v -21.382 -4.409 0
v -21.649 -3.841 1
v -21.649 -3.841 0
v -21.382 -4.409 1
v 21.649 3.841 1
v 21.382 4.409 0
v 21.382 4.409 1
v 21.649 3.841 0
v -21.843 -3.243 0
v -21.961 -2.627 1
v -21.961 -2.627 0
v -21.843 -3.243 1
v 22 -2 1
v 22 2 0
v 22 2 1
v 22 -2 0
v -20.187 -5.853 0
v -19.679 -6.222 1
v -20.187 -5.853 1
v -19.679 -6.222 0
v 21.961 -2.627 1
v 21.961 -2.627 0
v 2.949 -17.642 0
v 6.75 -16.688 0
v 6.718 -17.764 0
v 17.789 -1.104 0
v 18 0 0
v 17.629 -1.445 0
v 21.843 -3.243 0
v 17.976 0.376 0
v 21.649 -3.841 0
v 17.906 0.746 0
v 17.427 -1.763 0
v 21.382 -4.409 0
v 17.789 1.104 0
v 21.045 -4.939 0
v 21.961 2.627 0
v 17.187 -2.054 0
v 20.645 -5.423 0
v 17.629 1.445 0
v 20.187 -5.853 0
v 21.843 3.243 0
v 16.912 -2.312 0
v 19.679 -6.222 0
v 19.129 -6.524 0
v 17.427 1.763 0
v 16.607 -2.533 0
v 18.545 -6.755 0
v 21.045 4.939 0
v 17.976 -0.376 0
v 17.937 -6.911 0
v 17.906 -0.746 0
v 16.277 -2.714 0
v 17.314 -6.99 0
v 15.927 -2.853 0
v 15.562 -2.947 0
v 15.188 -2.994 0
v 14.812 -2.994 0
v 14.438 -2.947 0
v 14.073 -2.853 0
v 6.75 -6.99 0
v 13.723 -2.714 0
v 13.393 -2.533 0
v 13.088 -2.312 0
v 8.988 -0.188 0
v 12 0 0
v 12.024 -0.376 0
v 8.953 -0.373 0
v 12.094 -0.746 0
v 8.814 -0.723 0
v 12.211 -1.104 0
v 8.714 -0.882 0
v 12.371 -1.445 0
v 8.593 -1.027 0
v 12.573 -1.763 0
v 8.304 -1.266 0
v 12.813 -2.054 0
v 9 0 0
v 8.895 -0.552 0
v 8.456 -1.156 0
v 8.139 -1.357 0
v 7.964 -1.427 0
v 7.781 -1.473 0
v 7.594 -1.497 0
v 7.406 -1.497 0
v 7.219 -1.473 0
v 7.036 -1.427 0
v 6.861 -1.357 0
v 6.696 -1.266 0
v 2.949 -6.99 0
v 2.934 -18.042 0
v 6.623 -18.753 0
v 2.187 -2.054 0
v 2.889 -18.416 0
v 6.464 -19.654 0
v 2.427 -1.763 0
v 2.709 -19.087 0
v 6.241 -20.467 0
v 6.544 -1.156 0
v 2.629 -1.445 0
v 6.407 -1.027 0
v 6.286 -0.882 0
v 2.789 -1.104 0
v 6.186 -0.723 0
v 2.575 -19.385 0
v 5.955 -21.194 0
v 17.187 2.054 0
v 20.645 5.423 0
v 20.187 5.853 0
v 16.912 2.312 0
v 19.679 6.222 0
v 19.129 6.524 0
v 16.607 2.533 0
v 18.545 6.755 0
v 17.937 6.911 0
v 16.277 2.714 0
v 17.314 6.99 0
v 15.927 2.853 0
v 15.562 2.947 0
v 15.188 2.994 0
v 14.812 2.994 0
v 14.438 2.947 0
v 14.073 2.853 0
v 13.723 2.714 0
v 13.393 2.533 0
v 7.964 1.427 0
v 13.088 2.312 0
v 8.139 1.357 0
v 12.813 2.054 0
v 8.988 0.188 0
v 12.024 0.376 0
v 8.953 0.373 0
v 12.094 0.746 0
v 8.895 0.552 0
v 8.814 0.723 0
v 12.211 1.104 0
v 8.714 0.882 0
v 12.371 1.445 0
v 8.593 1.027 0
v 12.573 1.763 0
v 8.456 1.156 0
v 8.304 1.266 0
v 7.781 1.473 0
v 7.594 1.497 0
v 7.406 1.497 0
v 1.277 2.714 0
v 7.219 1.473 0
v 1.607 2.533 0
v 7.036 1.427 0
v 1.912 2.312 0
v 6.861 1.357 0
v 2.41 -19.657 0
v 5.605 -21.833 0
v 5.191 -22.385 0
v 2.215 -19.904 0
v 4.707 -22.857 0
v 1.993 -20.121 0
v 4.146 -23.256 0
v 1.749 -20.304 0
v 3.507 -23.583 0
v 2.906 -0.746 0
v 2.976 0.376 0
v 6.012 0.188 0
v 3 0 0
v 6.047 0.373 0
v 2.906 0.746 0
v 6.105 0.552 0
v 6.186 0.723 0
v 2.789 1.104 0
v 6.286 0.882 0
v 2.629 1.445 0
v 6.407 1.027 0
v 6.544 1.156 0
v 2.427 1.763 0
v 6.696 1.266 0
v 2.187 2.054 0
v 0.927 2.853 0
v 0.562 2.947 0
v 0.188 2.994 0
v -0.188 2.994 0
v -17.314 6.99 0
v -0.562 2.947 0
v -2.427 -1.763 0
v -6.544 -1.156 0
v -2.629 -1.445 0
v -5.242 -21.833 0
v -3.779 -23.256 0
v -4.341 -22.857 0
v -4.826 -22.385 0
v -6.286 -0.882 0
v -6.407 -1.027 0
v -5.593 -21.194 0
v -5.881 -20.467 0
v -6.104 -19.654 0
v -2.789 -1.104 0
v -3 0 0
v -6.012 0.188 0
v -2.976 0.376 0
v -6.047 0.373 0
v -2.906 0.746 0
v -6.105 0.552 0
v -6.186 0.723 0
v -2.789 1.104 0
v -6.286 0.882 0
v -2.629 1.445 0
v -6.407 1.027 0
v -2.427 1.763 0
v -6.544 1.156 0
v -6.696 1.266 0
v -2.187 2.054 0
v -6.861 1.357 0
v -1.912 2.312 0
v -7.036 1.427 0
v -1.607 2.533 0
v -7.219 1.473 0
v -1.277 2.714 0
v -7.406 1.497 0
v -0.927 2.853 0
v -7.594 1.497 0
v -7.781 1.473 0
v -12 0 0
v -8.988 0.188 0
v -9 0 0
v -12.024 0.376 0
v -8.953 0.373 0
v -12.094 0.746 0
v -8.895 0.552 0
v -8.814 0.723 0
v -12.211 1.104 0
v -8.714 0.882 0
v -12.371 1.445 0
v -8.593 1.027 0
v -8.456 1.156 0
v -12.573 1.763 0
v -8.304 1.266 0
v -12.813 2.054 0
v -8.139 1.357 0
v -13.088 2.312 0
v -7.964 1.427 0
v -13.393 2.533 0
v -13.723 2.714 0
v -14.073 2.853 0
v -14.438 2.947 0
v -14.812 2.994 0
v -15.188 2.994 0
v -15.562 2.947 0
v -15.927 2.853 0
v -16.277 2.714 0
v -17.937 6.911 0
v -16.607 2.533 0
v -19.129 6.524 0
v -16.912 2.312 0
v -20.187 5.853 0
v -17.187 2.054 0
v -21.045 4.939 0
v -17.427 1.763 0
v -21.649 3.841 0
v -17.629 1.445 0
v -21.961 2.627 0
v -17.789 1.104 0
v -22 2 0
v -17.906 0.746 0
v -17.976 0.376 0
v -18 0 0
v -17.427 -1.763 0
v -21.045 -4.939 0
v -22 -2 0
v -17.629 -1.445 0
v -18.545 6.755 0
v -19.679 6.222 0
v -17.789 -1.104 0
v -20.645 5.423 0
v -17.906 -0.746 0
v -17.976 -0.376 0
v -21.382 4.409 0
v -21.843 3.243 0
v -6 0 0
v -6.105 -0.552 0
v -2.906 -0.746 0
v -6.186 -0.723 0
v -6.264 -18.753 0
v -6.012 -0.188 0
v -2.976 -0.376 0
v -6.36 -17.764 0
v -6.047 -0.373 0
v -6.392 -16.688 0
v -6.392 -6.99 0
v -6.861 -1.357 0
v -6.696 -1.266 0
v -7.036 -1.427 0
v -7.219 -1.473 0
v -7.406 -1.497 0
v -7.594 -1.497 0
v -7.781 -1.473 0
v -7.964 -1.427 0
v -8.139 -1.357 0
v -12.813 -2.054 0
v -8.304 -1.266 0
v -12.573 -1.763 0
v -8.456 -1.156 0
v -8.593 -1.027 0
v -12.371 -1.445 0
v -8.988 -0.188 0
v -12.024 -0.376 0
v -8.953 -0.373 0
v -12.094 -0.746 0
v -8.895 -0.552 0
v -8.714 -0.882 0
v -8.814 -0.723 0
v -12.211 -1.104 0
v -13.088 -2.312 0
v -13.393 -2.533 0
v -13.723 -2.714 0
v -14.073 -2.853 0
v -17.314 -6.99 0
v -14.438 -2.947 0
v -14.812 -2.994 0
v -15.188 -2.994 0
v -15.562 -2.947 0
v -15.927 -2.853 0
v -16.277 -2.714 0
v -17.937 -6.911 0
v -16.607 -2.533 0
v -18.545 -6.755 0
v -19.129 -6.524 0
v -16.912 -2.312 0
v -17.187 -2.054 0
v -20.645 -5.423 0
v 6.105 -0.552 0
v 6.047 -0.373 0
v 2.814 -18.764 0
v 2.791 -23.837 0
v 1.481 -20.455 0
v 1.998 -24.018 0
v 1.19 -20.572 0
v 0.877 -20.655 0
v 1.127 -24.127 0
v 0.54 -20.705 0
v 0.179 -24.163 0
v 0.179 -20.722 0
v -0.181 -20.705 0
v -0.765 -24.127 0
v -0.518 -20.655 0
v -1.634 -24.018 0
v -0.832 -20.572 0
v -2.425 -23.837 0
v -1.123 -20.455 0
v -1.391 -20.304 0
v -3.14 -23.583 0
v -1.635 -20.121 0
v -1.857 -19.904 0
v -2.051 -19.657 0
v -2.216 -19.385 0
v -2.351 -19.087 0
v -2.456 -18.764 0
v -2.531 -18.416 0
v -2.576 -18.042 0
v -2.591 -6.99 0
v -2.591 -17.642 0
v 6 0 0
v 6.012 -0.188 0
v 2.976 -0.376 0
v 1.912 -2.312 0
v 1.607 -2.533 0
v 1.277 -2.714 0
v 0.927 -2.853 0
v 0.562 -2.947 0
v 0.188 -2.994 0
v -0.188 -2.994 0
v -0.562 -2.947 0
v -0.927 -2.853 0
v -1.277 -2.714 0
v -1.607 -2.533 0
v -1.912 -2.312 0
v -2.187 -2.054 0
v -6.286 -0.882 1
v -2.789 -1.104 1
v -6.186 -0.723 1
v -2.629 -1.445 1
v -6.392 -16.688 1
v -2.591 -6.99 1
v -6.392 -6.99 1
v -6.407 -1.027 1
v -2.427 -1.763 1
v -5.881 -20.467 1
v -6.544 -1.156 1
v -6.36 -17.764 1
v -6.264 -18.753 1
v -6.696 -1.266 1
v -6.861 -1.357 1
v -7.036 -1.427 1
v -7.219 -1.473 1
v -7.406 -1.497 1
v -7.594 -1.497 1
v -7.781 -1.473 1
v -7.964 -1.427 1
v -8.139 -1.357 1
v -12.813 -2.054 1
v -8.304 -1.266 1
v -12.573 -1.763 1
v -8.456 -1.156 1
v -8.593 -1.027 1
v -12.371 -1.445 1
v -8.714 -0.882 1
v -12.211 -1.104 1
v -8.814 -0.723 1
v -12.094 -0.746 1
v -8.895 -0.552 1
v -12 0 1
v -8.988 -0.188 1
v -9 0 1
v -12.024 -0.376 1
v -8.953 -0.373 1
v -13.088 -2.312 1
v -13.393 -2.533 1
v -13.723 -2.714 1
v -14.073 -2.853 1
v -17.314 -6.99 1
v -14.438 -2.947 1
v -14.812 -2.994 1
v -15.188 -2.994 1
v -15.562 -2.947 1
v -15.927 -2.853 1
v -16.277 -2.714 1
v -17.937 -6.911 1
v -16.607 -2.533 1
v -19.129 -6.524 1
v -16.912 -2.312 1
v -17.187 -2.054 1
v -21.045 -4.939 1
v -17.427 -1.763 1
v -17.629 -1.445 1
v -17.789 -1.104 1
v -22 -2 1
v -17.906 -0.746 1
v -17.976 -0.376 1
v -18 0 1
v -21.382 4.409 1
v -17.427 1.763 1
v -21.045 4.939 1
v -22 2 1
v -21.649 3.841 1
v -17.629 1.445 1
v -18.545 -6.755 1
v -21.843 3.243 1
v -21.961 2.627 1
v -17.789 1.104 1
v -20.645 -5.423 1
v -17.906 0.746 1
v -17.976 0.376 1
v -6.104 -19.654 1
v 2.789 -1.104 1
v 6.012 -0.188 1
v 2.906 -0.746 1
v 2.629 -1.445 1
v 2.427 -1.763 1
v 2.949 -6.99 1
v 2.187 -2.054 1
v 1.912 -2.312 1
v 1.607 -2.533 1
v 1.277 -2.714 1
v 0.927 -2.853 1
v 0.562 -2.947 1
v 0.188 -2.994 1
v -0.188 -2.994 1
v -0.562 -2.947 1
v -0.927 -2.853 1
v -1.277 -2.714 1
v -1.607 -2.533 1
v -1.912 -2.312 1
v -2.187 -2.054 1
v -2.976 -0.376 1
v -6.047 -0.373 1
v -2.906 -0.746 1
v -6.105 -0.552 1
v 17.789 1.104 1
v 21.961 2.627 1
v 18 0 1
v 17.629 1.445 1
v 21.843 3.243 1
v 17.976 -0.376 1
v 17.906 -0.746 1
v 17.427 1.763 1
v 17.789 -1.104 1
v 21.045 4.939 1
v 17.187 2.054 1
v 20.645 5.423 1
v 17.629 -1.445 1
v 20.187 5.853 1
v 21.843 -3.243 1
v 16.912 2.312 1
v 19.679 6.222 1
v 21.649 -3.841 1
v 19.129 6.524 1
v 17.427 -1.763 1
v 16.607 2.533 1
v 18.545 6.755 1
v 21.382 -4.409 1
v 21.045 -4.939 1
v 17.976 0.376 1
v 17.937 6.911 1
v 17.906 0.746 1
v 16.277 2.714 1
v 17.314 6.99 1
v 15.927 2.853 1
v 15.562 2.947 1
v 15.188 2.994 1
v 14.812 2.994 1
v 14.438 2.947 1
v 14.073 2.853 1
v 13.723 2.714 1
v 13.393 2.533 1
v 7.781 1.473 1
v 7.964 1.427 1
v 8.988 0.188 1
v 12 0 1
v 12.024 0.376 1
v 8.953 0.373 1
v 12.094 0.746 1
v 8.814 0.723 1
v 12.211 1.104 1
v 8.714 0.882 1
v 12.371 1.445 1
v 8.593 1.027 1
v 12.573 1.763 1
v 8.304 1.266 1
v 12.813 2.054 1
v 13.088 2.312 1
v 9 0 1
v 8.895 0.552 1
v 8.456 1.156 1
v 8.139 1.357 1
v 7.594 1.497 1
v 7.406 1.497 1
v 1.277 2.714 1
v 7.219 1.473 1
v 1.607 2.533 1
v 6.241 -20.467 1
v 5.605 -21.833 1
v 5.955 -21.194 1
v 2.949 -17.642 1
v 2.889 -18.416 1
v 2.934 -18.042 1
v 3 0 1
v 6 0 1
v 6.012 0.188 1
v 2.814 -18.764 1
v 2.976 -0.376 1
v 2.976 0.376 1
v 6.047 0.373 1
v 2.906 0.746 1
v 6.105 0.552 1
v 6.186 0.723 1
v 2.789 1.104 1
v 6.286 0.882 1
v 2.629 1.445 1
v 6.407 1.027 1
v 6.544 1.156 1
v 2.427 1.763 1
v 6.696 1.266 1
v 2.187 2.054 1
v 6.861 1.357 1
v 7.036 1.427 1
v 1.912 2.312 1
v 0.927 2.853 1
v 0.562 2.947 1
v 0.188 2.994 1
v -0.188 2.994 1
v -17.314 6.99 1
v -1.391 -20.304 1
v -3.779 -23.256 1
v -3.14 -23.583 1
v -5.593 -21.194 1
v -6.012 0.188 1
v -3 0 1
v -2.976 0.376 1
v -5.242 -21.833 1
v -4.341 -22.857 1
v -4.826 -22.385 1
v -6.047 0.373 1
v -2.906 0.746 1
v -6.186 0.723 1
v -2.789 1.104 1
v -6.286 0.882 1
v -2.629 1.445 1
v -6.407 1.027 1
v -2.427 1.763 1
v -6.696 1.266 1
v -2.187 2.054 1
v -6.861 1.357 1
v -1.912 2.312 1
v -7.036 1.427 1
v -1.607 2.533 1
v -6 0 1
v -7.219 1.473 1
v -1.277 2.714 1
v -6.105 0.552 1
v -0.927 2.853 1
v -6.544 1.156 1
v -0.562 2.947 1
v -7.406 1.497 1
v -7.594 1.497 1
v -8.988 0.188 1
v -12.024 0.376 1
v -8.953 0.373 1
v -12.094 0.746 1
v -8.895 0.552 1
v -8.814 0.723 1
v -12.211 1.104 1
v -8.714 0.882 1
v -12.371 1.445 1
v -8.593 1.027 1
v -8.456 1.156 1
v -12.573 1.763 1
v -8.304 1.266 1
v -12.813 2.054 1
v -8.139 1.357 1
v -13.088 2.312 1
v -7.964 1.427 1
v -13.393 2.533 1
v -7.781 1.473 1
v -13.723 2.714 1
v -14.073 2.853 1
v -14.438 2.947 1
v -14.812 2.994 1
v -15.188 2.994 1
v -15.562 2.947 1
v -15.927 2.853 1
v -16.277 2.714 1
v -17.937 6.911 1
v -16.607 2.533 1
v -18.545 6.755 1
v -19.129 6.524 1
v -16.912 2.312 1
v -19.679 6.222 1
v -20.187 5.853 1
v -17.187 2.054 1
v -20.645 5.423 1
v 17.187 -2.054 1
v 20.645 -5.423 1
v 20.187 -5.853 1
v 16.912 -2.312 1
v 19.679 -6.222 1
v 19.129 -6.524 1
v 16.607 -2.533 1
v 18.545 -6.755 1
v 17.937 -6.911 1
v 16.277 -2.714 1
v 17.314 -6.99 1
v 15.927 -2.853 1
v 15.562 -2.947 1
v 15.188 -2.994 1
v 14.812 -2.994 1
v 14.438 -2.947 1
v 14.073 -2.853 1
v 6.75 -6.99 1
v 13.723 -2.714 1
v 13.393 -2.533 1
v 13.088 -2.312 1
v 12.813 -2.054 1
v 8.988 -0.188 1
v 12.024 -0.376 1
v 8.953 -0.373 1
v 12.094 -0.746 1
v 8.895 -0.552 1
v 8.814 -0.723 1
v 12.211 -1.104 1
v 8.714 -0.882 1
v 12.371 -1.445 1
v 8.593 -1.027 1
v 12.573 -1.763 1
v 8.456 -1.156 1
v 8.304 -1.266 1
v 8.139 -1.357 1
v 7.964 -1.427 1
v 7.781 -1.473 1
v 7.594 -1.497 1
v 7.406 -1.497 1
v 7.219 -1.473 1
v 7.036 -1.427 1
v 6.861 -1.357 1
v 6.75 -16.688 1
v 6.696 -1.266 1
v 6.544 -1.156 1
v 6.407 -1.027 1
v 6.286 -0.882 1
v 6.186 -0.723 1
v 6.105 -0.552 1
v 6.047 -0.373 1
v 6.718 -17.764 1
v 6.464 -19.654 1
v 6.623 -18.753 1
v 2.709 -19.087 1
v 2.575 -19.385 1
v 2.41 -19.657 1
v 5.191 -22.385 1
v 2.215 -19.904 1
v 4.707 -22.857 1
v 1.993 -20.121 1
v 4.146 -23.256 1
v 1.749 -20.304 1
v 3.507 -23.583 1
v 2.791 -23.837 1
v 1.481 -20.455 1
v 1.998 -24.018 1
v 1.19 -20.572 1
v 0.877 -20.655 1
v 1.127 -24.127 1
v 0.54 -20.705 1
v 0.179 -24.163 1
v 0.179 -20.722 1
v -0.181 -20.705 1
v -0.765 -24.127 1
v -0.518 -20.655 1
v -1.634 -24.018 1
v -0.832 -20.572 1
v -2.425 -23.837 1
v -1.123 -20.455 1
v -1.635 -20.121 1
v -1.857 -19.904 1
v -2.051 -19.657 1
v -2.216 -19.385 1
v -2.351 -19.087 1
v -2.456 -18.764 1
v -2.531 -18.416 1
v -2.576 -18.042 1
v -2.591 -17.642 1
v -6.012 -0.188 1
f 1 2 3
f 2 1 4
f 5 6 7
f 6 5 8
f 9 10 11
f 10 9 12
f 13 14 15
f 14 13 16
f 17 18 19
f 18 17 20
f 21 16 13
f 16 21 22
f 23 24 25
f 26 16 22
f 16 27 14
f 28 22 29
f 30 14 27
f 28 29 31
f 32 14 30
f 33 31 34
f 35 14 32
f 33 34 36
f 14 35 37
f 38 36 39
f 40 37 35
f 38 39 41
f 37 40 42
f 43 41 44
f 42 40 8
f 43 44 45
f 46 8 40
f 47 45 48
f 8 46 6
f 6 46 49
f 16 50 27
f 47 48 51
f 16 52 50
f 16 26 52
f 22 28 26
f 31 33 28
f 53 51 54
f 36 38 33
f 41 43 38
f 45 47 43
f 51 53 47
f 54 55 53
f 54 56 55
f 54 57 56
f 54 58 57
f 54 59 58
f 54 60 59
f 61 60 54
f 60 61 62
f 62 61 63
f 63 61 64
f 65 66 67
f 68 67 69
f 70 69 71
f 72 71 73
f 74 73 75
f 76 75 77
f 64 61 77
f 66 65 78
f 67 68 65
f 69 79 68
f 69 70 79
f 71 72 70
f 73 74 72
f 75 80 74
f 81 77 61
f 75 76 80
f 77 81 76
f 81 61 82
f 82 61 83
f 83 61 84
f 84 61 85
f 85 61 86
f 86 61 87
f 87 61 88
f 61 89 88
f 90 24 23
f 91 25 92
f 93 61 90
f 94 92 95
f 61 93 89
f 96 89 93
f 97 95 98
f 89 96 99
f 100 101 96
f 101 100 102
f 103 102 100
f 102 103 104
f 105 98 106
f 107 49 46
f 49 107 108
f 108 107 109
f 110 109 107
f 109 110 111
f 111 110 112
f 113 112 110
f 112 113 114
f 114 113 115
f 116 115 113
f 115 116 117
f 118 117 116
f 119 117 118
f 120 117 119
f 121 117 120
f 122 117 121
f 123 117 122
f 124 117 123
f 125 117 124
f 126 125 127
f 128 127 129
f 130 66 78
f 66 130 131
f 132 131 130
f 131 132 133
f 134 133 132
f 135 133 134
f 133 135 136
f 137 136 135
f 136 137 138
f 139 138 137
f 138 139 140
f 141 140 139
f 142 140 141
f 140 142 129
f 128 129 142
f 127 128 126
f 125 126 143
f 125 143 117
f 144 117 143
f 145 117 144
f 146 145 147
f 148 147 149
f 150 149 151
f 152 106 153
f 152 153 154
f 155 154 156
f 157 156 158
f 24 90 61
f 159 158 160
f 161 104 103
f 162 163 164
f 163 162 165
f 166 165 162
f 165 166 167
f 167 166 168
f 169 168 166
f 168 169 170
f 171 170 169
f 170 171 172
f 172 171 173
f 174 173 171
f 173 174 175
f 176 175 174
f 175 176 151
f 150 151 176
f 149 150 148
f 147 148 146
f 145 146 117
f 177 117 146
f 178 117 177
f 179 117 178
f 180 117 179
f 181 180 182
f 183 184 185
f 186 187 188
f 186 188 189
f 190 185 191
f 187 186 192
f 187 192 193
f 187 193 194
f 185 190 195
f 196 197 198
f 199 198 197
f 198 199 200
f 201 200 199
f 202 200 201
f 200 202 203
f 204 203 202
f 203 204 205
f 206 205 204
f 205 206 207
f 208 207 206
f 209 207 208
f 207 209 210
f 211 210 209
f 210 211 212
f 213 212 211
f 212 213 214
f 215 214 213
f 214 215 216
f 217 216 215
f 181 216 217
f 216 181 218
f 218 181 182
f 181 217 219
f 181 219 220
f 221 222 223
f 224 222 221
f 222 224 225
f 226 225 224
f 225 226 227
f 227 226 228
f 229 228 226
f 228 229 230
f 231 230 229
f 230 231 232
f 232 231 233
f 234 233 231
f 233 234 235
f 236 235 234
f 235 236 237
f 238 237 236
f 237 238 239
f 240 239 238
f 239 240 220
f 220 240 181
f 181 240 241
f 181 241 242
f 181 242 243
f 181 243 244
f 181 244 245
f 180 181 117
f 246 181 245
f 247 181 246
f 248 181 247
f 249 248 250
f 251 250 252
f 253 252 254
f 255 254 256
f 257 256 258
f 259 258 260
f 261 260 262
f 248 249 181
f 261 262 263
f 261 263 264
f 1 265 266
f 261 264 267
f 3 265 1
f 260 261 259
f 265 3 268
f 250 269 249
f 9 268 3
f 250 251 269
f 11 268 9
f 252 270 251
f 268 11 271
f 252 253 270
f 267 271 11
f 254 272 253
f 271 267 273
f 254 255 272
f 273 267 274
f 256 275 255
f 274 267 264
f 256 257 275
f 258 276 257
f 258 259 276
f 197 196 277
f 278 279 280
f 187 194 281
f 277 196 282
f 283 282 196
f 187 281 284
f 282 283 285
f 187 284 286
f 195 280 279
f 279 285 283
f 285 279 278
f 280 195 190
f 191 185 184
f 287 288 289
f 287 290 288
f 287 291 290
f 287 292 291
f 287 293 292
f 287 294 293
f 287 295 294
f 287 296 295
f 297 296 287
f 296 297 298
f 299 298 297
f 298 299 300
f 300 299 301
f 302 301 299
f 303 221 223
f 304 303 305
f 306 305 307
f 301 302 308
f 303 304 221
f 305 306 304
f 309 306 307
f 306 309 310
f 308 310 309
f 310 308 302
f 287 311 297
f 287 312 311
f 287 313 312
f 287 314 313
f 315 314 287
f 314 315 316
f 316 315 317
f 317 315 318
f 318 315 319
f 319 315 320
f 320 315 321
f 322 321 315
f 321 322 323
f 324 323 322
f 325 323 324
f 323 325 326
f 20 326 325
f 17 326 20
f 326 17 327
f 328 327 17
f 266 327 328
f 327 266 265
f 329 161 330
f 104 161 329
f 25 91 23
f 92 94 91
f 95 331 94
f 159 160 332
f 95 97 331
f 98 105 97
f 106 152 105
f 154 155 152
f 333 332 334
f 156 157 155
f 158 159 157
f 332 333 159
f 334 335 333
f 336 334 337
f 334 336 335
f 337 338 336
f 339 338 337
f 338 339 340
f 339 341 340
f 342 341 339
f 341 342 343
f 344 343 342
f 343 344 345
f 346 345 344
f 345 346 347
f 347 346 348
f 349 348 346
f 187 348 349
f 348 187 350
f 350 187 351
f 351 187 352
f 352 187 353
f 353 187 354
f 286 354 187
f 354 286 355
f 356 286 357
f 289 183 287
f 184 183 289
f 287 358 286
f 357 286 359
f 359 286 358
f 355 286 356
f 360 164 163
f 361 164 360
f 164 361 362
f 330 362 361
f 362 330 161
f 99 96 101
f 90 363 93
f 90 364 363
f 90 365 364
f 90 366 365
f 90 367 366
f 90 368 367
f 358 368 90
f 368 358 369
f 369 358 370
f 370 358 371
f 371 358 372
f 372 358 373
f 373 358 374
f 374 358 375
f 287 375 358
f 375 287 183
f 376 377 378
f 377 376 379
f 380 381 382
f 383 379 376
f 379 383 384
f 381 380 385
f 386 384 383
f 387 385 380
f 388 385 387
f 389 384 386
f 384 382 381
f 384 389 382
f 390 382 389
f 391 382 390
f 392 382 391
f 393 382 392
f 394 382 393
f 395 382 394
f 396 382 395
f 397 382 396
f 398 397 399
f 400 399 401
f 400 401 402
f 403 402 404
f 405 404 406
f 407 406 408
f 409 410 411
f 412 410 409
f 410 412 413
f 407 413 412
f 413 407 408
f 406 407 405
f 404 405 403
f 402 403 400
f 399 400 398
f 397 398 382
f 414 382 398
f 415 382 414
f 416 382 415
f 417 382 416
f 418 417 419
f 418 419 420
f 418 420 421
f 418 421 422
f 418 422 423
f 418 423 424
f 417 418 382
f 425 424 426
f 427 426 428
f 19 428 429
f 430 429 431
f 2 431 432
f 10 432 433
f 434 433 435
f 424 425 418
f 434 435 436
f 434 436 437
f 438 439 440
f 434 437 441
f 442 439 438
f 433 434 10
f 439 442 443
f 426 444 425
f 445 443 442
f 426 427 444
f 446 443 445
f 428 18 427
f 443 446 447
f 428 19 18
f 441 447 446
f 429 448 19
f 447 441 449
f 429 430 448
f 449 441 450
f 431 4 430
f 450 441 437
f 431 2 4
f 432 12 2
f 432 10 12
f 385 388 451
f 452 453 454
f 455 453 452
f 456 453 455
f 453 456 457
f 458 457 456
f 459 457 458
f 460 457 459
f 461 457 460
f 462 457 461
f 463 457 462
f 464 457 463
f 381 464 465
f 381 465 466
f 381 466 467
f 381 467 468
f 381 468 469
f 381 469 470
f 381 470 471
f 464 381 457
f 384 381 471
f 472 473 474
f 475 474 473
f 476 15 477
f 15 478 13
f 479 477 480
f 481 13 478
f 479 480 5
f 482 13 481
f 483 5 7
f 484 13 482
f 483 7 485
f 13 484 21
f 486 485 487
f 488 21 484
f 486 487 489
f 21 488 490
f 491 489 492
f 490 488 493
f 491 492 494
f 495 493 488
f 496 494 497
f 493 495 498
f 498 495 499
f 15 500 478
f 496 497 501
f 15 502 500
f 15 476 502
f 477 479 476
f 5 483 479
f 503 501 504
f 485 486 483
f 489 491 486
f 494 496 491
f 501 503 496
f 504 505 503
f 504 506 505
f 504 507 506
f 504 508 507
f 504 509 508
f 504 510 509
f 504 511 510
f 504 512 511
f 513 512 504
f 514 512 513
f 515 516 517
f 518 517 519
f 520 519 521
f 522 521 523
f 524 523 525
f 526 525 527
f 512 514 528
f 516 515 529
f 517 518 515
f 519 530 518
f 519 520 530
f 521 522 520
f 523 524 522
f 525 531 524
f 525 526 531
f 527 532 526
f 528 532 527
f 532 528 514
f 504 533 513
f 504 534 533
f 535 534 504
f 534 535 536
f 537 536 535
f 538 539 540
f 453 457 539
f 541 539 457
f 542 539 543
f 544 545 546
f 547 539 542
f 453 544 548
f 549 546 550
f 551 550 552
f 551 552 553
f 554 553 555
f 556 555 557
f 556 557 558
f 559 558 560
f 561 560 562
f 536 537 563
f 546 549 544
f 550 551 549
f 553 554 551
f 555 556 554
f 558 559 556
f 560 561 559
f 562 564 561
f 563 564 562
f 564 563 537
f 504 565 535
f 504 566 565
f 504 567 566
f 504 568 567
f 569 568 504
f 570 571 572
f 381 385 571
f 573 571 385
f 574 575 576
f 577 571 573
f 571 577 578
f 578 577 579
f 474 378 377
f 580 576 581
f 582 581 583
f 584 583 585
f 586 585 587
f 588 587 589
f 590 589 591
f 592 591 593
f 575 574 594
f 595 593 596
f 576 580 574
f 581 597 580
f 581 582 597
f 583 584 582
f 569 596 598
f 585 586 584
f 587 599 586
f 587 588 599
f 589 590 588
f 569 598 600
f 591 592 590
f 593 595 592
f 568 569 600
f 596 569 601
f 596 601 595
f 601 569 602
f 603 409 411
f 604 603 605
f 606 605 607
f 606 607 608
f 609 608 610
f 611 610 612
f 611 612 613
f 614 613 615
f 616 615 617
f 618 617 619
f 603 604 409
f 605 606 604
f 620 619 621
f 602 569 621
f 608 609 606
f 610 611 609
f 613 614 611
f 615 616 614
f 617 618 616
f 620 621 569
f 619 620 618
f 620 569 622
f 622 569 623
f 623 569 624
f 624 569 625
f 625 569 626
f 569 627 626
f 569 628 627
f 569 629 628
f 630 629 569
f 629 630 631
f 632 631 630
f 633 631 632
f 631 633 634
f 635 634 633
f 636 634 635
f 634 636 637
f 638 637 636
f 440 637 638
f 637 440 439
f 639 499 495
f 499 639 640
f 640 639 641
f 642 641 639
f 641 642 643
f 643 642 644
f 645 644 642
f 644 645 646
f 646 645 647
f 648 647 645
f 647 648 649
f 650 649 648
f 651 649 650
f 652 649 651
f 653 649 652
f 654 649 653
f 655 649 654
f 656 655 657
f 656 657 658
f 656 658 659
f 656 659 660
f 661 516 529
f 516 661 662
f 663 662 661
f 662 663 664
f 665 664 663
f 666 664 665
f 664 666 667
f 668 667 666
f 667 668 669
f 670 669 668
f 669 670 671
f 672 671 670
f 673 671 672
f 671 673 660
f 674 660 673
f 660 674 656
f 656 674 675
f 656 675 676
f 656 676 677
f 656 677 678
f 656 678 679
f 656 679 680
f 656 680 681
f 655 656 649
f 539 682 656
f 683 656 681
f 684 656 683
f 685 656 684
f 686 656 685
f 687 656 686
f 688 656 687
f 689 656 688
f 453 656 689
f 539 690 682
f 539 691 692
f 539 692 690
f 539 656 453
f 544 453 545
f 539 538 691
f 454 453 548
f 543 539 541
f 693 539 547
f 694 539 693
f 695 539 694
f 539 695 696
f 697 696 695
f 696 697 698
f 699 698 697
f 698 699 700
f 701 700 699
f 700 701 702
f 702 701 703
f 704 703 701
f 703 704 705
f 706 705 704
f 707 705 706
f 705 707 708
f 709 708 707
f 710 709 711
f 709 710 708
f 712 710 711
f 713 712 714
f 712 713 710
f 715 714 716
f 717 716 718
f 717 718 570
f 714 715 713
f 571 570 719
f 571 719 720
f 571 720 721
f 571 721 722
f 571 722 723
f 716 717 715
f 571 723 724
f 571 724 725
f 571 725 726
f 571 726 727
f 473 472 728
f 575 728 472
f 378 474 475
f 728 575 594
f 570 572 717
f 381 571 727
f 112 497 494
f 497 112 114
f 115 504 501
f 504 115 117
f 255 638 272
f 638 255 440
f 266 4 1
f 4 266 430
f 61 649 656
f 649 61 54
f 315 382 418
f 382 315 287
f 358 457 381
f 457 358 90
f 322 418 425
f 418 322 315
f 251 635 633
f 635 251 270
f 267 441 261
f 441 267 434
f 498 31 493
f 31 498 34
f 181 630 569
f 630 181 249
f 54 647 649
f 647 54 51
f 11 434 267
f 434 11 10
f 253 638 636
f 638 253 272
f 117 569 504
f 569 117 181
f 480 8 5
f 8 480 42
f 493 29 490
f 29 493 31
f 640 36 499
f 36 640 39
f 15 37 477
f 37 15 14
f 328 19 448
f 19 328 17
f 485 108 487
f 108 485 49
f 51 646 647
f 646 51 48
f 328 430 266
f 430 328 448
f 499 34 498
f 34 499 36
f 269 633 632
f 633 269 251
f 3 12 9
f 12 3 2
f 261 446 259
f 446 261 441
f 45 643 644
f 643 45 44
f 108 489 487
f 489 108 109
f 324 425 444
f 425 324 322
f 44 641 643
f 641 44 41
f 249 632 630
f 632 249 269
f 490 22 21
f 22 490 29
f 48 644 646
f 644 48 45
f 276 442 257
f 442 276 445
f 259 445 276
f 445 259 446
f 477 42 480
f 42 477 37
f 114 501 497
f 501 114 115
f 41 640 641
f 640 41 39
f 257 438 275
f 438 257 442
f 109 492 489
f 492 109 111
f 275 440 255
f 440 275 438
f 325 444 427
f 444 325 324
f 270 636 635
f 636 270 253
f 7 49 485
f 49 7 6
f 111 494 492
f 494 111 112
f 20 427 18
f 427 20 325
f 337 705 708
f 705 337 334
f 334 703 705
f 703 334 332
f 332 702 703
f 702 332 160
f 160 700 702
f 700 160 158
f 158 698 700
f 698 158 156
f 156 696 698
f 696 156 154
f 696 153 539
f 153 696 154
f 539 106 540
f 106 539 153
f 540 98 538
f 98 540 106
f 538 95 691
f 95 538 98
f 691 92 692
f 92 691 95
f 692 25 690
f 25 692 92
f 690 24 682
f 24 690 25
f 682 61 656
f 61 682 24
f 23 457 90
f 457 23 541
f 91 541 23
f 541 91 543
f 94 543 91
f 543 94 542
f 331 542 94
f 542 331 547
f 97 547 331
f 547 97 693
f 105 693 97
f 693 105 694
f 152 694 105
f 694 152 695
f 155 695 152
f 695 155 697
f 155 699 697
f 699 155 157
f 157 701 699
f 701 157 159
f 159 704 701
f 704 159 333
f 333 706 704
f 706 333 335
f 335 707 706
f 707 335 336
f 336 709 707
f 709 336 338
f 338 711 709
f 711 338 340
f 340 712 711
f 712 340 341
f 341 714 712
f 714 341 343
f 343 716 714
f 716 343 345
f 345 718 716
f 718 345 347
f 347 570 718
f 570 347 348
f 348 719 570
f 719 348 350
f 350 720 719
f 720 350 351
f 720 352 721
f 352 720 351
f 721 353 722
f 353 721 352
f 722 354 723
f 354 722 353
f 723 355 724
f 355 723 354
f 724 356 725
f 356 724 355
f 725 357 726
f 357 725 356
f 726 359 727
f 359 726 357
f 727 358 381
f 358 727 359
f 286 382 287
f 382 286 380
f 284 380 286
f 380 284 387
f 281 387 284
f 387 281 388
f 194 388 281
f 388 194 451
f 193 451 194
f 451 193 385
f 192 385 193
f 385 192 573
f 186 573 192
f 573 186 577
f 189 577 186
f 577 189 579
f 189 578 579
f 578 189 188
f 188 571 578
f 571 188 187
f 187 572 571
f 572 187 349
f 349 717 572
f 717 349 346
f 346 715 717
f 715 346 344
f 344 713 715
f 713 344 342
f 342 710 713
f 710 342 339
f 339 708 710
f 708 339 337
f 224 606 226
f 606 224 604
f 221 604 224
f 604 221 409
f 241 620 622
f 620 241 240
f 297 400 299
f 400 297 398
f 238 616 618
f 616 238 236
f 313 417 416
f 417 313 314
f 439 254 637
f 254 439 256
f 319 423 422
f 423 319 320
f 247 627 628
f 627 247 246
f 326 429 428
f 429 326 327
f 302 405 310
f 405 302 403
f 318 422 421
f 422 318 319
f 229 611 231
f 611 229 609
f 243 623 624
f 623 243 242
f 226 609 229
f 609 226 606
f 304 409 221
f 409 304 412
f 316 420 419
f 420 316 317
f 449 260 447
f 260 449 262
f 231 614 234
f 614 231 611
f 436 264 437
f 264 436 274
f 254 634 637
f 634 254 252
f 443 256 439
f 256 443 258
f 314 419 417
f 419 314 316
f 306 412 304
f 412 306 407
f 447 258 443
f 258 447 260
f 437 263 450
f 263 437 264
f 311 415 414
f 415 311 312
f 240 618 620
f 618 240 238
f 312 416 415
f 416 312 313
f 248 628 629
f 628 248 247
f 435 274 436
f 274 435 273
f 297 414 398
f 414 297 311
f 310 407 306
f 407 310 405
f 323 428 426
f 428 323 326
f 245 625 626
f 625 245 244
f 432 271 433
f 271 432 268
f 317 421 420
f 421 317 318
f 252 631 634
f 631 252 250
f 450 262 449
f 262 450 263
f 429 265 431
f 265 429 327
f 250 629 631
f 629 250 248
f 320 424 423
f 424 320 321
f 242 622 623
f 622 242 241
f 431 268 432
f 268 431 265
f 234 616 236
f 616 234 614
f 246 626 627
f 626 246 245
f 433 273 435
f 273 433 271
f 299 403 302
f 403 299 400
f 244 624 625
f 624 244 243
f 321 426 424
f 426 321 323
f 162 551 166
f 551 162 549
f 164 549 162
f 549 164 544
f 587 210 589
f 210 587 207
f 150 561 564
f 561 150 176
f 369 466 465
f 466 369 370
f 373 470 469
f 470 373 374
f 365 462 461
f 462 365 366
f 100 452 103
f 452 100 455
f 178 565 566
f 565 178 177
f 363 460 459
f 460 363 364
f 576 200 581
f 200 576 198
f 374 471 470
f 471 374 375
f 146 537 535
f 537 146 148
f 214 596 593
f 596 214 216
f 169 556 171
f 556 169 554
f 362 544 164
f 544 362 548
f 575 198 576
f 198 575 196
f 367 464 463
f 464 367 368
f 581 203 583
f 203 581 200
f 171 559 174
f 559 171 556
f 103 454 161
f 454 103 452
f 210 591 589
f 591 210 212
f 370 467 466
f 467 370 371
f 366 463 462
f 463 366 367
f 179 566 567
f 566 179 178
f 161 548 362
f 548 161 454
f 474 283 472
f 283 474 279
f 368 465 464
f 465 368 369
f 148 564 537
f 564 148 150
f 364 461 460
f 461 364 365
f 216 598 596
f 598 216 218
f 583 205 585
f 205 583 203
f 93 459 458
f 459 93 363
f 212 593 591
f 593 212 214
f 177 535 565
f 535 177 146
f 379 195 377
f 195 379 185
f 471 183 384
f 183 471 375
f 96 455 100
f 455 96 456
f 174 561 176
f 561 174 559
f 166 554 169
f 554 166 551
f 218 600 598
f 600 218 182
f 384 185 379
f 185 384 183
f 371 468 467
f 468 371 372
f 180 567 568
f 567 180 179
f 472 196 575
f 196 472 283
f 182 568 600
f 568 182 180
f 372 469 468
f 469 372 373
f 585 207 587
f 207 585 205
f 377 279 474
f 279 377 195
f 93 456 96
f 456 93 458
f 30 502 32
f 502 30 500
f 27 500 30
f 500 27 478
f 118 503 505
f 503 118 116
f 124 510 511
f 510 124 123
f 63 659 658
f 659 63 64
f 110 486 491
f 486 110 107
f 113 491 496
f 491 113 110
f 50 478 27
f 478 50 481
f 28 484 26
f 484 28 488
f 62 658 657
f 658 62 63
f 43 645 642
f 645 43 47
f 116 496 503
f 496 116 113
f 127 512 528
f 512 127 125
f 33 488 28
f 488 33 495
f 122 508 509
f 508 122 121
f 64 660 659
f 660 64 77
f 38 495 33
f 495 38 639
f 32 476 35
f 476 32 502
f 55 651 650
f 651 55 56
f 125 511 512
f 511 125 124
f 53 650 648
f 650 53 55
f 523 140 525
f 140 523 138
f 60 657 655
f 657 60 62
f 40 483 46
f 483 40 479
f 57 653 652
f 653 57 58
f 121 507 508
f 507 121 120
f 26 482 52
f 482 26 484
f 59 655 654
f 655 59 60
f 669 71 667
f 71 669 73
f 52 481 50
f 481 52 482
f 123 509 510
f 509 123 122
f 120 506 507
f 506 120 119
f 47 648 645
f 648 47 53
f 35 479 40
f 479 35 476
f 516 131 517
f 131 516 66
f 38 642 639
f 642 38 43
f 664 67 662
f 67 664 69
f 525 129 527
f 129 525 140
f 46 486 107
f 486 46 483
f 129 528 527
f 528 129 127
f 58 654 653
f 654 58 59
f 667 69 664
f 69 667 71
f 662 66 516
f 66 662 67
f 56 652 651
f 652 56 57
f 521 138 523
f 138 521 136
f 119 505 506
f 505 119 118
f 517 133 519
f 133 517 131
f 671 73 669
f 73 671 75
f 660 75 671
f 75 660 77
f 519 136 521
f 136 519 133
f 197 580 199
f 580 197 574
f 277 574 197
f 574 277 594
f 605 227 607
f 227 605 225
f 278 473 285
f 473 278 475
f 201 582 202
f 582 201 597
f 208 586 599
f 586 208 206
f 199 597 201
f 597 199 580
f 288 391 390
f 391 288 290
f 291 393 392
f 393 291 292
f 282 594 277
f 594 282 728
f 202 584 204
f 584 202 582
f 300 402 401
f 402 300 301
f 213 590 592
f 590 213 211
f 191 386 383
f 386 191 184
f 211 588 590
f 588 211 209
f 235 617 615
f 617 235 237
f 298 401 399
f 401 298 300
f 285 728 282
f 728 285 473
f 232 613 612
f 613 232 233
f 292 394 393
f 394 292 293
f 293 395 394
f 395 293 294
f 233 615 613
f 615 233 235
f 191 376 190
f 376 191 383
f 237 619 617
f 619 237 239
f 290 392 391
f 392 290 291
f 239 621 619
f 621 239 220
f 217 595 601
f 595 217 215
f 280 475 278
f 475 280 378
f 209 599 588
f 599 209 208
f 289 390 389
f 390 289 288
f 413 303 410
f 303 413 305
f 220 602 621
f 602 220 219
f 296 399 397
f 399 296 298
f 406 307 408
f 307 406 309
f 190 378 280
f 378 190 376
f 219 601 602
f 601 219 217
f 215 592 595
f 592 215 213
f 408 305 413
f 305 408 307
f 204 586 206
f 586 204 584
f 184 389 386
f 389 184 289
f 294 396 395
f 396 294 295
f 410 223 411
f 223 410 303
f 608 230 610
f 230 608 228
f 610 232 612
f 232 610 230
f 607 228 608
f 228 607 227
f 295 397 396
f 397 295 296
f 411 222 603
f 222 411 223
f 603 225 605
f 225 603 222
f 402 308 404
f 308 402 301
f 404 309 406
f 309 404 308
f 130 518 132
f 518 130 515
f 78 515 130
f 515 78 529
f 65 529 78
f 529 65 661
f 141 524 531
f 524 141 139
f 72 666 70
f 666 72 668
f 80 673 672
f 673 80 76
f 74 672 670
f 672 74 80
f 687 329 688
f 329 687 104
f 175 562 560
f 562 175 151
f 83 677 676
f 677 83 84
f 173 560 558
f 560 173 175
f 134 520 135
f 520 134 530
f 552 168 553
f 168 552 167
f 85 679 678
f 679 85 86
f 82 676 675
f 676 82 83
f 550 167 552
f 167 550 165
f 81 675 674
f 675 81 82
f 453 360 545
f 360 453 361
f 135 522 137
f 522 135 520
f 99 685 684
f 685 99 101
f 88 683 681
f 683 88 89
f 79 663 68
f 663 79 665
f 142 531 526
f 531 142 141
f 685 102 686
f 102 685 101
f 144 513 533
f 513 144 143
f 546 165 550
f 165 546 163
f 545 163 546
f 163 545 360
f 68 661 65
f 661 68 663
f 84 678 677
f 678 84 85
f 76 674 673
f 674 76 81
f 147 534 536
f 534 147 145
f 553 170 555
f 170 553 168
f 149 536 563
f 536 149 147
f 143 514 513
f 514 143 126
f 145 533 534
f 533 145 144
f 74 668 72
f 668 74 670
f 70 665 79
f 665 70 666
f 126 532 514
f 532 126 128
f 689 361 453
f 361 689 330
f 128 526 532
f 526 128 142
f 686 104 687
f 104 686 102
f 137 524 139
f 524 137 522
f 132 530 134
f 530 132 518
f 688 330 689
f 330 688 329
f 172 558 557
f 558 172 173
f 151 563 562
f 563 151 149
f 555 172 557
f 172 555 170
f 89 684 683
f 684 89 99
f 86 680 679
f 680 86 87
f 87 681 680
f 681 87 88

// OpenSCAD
$fn = 50;


difference() {
	union() {
		*color(alpha = 1.0000000000, c = "gray") {
			translate(v = [0, 14, 0]) {
				linear_extrude(height = 1) {
					text(font = "Arial:style=Bold", halign = "center", size = 4.5000000000, text = "COMMENT description oobb_plate_shape_p_type_1_depth_3_width_1_thickness_u_extra_oobb_size", valign = "center");
				}
			}
		}
		hull() {
			translate(v = [-17.0000000000, 2.0000000000, 0]) {
				cylinder(h = 1, r = 5);
			}
			translate(v = [17.0000000000, 2.0000000000, 0]) {
				cylinder(h = 1, r = 5);
			}
			translate(v = [-17.0000000000, -2.0000000000, 0]) {
				cylinder(h = 1, r = 5);
			}
			translate(v = [17.0000000000, -2.0000000000, 0]) {
				cylinder(h = 1, r = 5);
			}
		}
		translate(v = [0, -5, 0]) {
			linear_extrude(height = 1) {
				text(font = "DejaVu Sans Mono:style=Bold", halign = "center", size = 19.0000000000, text = "U", valign = "top");
			}
		}
	}
	union() {
		*color(alpha = 1.0000000000, c = "gray") {
			translate(v = [0, 14, 0]) {
				linear_extrude(height = 1) {
					text(font = "Arial:style=Bold", halign = "center", size = 4.5000000000, text = "COMMENT description oobb_holes_shape_n_type_3_width_1_thickness_u_extra_oobb_size_1_height_'all'_holes_true_both_holes", valign = "center");
				}
			}
		}
		translate(v = [-15.0000000000, 0.0000000000, 0]) {
			translate(v = [0, 0, -50]) {
				cylinder(h = 100, r = 3.0000000000);
			}
		}
		translate(v = [0, 0, -50]) {
			cylinder(h = 100, r = 3.0000000000);
		}
		translate(v = [15.0000000000, 0.0000000000, 0]) {
			translate(v = [0, 0, -50]) {
				cylinder(h = 100, r = 3.0000000000);
			}
		}
		translate(v = [-15.0000000000, 0.0000000000, 0]) {
			translate(v = [0, 0, -50]) {
				cylinder(h = 100, r = 1.5000000000);
			}
		}
		translate(v = [-7.5000000000, 0.0000000000, 0]) {
			translate(v = [0, 0, -50]) {
				cylinder(h = 100, r = 1.5000000000);
			}
		}
		translate(v = [0, 0, -50]) {
			cylinder(h = 100, r = 1.5000000000);
		}
		translate(v = [7.5000000000, 0.0000000000, 0]) {
			translate(v = [0, 0, -50]) {
				cylinder(h = 100, r = 1.5000000000);
			}
		}
		translate(v = [15.0000000000, 0.0000000000, 0]) {
			translate(v = [0, 0, -50]) {
				cylinder(h = 100, r = 1.5000000000);
			}
		}
	}
}
